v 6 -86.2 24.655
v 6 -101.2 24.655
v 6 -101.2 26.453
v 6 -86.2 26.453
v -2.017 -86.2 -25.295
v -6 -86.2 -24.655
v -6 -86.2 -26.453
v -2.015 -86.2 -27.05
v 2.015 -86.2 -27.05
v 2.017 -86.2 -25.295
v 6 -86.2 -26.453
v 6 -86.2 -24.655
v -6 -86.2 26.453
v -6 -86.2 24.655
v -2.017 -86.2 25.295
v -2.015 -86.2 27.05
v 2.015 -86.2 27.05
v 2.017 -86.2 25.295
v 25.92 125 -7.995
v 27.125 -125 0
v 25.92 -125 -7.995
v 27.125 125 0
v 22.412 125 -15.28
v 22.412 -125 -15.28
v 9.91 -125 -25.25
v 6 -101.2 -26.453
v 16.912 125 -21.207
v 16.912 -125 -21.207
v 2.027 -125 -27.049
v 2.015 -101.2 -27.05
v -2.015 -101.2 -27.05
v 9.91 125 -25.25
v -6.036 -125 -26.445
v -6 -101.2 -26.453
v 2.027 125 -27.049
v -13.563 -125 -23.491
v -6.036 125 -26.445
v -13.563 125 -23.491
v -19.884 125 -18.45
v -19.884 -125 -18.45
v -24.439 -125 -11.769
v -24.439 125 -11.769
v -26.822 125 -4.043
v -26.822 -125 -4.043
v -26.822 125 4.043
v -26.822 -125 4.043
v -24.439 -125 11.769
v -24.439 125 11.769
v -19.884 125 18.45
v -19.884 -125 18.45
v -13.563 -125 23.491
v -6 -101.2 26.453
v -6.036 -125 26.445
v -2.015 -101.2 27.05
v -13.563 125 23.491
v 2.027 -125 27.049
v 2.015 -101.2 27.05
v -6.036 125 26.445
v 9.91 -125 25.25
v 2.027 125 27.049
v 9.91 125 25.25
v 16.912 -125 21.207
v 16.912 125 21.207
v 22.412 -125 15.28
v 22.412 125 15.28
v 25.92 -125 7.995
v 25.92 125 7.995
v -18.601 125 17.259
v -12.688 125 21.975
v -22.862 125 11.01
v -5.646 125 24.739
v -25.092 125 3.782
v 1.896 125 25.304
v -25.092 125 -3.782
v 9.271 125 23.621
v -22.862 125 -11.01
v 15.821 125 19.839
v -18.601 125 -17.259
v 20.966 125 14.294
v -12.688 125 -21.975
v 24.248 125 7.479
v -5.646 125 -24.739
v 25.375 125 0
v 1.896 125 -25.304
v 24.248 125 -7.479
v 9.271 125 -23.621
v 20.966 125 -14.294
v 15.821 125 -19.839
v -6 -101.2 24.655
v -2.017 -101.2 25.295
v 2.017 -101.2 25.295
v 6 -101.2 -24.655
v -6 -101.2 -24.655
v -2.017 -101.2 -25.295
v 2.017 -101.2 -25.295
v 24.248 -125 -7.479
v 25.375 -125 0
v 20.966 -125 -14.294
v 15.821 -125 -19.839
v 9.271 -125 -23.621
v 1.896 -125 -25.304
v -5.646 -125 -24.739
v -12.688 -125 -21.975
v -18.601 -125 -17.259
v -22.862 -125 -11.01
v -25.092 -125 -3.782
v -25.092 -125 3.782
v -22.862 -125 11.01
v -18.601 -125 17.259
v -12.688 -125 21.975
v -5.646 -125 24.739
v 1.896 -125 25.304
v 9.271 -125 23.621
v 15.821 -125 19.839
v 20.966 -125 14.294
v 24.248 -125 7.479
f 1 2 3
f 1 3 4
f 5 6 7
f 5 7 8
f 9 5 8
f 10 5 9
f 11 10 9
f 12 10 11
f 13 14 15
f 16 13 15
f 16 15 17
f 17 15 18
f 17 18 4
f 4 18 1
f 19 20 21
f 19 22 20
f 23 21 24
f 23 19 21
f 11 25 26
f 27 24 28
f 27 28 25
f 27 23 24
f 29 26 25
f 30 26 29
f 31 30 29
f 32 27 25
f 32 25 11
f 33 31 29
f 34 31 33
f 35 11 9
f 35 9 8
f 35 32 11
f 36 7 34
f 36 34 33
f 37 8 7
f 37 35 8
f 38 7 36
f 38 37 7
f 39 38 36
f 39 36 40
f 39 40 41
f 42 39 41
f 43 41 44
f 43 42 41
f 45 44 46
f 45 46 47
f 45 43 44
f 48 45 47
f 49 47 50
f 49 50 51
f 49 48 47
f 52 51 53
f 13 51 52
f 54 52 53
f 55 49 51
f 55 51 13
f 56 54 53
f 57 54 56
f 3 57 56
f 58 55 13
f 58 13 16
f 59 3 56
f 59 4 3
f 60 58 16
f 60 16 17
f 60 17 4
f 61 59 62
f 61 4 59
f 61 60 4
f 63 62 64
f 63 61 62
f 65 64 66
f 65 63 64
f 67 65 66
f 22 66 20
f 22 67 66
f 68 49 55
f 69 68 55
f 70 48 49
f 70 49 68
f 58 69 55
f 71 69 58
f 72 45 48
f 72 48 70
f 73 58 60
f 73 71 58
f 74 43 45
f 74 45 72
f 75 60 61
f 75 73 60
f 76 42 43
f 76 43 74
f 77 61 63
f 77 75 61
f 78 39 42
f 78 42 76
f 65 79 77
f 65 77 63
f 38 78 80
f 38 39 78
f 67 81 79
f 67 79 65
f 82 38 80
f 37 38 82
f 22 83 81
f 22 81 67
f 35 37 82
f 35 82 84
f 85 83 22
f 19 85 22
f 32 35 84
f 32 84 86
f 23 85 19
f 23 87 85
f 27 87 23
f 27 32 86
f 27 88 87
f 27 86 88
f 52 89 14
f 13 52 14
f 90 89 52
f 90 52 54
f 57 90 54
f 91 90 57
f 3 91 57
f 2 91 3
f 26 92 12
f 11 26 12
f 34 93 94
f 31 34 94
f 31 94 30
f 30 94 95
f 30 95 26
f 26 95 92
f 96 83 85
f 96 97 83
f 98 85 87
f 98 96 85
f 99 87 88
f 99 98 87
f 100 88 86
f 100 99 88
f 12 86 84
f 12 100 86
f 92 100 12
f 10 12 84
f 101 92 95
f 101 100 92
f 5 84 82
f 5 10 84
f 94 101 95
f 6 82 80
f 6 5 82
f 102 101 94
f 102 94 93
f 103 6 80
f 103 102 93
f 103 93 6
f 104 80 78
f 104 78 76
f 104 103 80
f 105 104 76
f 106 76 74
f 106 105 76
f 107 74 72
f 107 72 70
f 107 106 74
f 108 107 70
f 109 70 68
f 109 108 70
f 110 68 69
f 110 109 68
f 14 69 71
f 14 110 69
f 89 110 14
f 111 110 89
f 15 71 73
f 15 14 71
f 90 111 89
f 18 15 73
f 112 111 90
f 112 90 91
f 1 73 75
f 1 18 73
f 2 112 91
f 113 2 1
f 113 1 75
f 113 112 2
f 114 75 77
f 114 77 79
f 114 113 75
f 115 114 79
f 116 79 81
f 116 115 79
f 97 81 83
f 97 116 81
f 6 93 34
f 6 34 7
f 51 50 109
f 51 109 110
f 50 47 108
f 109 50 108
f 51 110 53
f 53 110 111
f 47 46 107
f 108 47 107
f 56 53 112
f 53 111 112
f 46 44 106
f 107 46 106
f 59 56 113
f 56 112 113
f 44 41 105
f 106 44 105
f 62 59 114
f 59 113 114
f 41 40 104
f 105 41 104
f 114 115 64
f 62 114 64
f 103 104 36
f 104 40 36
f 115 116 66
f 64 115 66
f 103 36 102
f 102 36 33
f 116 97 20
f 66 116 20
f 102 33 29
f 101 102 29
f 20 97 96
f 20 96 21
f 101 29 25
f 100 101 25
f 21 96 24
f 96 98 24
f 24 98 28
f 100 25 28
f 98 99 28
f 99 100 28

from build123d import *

# Parameters (mm, degrees)
SKETCH1_R               = 27.125
SKETCH1_R_2             = 25.375
BOSS_EXTRUDE1_DEPTH     = 125
SKETCH5_W               = 12
SKETCH5_H               = 15
CUT_EXTRUDE1_DEPTH      = 28.125
CUT_EXTRUDE1_DEPTH_BACK = 28.125


with BuildPart() as part:
    # Sketch1 → Boss-Extrude1 (new body, symmetric)
    with BuildSketch(Plane(origin=(0, 0, 0), x_dir=(1, 0, 0), z_dir=(0, 1, 0))):
        Circle(SKETCH1_R)
        Circle(SKETCH1_R_2, mode=Mode.SUBTRACT)
    extrude(amount=BOSS_EXTRUDE1_DEPTH, both=True)

    # Sketch5 → Cut-Extrude1 (cut, two sides)
    with BuildSketch(Plane.XY) as cut_extrude1_sk:
        with Locations((0, -93.7)):
            Rectangle(SKETCH5_W, SKETCH5_H)
    extrude(amount=CUT_EXTRUDE1_DEPTH, mode=Mode.SUBTRACT)
    extrude(cut_extrude1_sk.sketch, amount=-CUT_EXTRUDE1_DEPTH_BACK, mode=Mode.SUBTRACT)


solid = part.part
